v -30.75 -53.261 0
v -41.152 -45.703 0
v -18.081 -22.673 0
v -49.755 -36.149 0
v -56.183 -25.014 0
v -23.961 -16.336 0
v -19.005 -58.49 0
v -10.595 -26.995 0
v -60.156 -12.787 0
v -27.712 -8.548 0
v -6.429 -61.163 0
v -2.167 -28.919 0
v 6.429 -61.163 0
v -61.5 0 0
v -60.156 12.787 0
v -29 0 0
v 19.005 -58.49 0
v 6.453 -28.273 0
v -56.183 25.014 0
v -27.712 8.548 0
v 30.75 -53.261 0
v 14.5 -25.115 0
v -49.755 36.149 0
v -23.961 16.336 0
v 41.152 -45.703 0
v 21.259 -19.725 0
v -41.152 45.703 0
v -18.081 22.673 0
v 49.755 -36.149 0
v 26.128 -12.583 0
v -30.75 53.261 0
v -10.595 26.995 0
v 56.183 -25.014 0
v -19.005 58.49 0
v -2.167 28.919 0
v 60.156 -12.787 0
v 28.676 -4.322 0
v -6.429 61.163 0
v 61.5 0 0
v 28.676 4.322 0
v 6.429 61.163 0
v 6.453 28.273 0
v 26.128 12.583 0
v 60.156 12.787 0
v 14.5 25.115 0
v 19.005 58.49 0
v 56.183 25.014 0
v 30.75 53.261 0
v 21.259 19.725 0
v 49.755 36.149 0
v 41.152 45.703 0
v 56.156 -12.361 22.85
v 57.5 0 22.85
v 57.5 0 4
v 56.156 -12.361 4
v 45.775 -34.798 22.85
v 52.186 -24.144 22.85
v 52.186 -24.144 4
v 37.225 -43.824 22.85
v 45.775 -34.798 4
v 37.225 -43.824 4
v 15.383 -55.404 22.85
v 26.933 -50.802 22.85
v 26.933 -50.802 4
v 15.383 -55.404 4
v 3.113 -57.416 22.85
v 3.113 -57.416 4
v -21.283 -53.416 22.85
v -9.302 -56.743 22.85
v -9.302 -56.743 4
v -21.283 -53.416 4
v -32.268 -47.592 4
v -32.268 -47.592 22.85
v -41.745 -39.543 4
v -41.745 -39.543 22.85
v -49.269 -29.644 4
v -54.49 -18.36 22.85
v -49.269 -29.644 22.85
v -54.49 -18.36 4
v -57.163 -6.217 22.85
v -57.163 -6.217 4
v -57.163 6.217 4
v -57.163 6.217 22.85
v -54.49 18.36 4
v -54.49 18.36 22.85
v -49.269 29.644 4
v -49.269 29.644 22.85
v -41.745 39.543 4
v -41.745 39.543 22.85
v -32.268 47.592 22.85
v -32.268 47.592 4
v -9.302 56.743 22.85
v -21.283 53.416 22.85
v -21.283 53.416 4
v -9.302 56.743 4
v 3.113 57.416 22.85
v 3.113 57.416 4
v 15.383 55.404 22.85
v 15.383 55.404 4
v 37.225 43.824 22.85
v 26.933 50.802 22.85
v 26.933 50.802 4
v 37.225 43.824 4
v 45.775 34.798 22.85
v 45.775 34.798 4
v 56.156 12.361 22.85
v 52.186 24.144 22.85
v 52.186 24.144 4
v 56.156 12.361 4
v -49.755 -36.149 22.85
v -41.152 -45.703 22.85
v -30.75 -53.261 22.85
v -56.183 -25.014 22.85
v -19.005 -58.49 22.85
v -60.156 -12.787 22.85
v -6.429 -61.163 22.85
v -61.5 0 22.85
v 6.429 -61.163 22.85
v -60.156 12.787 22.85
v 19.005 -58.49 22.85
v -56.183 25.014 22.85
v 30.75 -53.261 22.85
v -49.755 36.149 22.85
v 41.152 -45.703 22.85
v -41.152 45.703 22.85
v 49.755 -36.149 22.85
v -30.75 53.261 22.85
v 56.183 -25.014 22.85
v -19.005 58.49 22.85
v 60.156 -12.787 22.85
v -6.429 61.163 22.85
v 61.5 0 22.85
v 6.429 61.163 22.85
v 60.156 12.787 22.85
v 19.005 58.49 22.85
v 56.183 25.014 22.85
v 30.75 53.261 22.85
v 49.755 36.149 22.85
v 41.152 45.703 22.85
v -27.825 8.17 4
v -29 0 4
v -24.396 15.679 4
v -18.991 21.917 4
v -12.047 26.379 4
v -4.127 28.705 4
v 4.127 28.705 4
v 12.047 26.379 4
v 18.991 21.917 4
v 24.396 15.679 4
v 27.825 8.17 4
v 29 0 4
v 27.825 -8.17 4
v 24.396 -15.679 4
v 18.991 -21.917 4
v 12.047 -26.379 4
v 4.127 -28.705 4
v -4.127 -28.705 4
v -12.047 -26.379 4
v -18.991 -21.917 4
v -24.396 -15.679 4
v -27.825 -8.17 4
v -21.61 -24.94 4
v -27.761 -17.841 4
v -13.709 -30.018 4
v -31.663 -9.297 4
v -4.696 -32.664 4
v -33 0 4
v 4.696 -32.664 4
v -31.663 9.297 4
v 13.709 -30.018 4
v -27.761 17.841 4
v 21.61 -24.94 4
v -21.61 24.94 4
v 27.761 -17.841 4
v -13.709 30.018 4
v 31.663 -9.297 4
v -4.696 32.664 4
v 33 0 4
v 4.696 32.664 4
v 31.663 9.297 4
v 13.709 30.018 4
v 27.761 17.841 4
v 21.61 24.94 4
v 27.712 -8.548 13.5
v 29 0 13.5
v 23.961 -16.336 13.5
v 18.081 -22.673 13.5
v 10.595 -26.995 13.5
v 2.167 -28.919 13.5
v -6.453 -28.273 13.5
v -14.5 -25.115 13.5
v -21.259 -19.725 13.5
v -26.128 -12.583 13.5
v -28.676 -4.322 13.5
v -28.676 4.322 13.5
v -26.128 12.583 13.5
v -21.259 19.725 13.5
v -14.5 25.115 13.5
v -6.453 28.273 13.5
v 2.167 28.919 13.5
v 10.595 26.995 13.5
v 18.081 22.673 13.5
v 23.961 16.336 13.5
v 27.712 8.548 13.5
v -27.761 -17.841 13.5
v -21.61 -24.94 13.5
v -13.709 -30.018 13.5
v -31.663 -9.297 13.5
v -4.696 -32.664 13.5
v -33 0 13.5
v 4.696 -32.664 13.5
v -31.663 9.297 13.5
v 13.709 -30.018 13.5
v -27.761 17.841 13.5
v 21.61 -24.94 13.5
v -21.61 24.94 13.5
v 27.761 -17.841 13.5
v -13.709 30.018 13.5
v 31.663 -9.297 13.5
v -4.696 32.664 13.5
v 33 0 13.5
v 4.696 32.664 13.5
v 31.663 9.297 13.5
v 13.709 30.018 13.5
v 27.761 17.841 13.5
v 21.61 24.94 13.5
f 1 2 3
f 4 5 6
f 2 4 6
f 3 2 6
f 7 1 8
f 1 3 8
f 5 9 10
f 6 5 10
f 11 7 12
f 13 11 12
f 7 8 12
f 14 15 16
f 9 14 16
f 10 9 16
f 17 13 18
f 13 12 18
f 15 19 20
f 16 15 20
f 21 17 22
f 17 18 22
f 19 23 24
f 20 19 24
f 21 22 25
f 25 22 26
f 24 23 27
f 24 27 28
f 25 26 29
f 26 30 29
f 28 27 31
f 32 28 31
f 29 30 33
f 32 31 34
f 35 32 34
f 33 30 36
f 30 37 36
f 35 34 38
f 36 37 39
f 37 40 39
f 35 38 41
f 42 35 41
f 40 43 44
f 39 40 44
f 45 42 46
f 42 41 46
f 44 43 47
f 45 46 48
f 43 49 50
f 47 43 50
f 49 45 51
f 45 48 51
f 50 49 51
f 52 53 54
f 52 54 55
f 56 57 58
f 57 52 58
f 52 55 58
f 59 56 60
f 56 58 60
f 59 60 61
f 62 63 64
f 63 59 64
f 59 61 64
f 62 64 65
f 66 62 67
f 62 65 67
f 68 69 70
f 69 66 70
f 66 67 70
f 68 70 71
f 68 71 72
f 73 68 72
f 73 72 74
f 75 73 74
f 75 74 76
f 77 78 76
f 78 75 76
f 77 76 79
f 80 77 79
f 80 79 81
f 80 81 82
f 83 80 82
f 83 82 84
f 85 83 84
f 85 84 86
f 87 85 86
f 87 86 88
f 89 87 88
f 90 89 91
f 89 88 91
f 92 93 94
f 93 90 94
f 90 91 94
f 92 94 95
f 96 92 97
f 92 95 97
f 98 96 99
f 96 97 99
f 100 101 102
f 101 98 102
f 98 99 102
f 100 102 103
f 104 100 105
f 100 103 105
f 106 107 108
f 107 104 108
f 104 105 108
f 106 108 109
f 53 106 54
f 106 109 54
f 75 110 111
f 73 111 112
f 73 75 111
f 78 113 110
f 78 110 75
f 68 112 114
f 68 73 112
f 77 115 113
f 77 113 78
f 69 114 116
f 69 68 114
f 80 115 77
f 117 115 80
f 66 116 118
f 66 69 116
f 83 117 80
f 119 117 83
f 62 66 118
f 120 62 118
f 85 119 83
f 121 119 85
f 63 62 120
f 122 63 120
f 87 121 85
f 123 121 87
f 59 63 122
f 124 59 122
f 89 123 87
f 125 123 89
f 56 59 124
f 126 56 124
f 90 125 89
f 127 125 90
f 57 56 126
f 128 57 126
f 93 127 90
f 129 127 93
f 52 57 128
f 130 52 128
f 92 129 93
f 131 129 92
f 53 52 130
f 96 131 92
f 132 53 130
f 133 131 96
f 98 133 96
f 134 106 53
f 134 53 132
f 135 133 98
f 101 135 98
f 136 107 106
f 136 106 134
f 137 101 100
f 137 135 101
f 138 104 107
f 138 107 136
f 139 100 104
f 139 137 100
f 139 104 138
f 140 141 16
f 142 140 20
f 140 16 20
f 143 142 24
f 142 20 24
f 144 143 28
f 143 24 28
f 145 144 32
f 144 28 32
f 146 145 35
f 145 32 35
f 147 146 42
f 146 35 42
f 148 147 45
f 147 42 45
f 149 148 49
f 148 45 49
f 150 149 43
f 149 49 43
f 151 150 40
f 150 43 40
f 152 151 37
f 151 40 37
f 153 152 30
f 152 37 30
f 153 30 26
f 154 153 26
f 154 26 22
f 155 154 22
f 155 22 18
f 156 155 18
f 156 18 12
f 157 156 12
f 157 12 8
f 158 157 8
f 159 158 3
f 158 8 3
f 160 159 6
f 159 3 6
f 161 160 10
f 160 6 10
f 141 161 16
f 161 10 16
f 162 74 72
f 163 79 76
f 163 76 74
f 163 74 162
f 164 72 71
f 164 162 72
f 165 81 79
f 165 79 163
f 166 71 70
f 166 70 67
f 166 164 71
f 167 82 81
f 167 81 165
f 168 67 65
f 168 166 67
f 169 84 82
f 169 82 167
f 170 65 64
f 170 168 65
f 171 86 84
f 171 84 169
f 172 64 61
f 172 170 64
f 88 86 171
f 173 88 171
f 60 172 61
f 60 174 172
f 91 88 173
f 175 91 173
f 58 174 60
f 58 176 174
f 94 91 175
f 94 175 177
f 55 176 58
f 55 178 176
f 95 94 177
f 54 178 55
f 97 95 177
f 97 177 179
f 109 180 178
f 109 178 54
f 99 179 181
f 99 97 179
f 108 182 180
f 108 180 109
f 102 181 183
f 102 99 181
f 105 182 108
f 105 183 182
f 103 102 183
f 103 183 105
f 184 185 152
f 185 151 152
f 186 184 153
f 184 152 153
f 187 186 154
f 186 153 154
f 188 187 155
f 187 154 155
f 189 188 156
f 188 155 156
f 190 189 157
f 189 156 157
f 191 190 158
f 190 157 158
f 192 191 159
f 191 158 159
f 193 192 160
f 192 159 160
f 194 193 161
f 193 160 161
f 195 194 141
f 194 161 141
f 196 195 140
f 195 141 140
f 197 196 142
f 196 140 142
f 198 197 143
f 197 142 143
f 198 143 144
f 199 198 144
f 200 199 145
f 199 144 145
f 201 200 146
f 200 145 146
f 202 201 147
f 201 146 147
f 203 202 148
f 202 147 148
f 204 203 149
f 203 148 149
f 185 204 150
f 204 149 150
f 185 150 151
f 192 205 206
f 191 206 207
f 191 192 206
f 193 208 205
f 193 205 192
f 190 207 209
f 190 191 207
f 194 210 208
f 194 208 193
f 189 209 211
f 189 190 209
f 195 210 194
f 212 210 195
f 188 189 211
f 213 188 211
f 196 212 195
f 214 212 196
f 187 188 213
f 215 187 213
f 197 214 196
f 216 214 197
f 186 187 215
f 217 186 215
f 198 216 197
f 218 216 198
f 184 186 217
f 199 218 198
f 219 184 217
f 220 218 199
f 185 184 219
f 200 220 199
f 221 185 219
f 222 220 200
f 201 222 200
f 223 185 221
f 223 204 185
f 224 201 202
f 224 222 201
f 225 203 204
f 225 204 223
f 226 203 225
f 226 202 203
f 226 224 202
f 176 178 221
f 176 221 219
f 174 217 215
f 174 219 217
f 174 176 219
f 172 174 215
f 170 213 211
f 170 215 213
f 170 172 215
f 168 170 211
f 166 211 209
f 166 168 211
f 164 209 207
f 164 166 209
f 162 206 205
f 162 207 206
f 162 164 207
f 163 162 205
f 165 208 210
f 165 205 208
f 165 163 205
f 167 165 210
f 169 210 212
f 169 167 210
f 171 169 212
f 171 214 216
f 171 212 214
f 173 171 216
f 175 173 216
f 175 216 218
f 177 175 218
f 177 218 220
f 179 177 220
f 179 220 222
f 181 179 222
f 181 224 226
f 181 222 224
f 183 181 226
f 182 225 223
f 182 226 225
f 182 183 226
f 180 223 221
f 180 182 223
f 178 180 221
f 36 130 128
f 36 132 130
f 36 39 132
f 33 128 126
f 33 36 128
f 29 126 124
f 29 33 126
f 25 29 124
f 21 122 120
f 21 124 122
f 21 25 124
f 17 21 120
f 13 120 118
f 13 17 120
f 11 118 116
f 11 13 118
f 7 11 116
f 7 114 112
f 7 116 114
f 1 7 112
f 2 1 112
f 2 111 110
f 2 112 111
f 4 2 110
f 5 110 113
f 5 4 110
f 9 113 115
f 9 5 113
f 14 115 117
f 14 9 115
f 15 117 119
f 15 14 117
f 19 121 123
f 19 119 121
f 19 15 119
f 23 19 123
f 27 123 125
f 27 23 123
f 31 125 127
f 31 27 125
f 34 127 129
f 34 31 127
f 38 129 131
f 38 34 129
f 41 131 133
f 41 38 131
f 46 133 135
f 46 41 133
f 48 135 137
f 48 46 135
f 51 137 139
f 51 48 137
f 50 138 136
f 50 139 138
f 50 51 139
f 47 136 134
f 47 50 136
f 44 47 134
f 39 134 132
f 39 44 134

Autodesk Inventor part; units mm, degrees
ref_plane "YZ Plane" through (0, 0, 0) normal (1, 0, 0) x (0, 1, 0)
ref_plane "XZ Plane" through (0, 0, 0) normal (0, 1, 0) x (-1, 0, 0)
ref_plane "XY Plane" through (0, 0, 0) normal (0, 0, 1) x (1, 0, 0)
sketch "Sketch1" plane through (0, 0, 0) normal (0, 0, 1) x (1, 0, 0)
  circle A0 centre (0, 0) radius 61.5
  dimension "d0" = 123
extrude "Extrusion1" add sketch "Sketch1" along normal blind 4
sketch "Sketch2" plane through (0, 0, 4) normal (0, 0, 1) x (1, 0, 0)
  circle A0 centre (0, 0) radius 61.5 projected
  circle A1 centre (0, 0) radius 57.5
  dimension "d12" = 115
extrude "Extrusion2" add sketch "Sketch2" along normal blind 18.85
sketch "Sketch3" plane through (0, 0, 0) normal (0, 0, -1) x (-1, 0, 0)
  circle A0 centre (0, 0) radius 29
  dimension "d6" = 58
extrude "Extrusion3" cut sketch "Sketch3" against normal through all
sketch "Sketch4" plane through (0, 0, 4) normal (0, 0, 1) x (1, 0, 0)
  circle A0 centre (0, 0) radius 29 projected
  circle A1 centre (0, 0) radius 33
  dimension "d9" = 4
extrude "Extrusion4" add sketch "Sketch4" along normal blind 9.5
properties part number "stator_housing"
